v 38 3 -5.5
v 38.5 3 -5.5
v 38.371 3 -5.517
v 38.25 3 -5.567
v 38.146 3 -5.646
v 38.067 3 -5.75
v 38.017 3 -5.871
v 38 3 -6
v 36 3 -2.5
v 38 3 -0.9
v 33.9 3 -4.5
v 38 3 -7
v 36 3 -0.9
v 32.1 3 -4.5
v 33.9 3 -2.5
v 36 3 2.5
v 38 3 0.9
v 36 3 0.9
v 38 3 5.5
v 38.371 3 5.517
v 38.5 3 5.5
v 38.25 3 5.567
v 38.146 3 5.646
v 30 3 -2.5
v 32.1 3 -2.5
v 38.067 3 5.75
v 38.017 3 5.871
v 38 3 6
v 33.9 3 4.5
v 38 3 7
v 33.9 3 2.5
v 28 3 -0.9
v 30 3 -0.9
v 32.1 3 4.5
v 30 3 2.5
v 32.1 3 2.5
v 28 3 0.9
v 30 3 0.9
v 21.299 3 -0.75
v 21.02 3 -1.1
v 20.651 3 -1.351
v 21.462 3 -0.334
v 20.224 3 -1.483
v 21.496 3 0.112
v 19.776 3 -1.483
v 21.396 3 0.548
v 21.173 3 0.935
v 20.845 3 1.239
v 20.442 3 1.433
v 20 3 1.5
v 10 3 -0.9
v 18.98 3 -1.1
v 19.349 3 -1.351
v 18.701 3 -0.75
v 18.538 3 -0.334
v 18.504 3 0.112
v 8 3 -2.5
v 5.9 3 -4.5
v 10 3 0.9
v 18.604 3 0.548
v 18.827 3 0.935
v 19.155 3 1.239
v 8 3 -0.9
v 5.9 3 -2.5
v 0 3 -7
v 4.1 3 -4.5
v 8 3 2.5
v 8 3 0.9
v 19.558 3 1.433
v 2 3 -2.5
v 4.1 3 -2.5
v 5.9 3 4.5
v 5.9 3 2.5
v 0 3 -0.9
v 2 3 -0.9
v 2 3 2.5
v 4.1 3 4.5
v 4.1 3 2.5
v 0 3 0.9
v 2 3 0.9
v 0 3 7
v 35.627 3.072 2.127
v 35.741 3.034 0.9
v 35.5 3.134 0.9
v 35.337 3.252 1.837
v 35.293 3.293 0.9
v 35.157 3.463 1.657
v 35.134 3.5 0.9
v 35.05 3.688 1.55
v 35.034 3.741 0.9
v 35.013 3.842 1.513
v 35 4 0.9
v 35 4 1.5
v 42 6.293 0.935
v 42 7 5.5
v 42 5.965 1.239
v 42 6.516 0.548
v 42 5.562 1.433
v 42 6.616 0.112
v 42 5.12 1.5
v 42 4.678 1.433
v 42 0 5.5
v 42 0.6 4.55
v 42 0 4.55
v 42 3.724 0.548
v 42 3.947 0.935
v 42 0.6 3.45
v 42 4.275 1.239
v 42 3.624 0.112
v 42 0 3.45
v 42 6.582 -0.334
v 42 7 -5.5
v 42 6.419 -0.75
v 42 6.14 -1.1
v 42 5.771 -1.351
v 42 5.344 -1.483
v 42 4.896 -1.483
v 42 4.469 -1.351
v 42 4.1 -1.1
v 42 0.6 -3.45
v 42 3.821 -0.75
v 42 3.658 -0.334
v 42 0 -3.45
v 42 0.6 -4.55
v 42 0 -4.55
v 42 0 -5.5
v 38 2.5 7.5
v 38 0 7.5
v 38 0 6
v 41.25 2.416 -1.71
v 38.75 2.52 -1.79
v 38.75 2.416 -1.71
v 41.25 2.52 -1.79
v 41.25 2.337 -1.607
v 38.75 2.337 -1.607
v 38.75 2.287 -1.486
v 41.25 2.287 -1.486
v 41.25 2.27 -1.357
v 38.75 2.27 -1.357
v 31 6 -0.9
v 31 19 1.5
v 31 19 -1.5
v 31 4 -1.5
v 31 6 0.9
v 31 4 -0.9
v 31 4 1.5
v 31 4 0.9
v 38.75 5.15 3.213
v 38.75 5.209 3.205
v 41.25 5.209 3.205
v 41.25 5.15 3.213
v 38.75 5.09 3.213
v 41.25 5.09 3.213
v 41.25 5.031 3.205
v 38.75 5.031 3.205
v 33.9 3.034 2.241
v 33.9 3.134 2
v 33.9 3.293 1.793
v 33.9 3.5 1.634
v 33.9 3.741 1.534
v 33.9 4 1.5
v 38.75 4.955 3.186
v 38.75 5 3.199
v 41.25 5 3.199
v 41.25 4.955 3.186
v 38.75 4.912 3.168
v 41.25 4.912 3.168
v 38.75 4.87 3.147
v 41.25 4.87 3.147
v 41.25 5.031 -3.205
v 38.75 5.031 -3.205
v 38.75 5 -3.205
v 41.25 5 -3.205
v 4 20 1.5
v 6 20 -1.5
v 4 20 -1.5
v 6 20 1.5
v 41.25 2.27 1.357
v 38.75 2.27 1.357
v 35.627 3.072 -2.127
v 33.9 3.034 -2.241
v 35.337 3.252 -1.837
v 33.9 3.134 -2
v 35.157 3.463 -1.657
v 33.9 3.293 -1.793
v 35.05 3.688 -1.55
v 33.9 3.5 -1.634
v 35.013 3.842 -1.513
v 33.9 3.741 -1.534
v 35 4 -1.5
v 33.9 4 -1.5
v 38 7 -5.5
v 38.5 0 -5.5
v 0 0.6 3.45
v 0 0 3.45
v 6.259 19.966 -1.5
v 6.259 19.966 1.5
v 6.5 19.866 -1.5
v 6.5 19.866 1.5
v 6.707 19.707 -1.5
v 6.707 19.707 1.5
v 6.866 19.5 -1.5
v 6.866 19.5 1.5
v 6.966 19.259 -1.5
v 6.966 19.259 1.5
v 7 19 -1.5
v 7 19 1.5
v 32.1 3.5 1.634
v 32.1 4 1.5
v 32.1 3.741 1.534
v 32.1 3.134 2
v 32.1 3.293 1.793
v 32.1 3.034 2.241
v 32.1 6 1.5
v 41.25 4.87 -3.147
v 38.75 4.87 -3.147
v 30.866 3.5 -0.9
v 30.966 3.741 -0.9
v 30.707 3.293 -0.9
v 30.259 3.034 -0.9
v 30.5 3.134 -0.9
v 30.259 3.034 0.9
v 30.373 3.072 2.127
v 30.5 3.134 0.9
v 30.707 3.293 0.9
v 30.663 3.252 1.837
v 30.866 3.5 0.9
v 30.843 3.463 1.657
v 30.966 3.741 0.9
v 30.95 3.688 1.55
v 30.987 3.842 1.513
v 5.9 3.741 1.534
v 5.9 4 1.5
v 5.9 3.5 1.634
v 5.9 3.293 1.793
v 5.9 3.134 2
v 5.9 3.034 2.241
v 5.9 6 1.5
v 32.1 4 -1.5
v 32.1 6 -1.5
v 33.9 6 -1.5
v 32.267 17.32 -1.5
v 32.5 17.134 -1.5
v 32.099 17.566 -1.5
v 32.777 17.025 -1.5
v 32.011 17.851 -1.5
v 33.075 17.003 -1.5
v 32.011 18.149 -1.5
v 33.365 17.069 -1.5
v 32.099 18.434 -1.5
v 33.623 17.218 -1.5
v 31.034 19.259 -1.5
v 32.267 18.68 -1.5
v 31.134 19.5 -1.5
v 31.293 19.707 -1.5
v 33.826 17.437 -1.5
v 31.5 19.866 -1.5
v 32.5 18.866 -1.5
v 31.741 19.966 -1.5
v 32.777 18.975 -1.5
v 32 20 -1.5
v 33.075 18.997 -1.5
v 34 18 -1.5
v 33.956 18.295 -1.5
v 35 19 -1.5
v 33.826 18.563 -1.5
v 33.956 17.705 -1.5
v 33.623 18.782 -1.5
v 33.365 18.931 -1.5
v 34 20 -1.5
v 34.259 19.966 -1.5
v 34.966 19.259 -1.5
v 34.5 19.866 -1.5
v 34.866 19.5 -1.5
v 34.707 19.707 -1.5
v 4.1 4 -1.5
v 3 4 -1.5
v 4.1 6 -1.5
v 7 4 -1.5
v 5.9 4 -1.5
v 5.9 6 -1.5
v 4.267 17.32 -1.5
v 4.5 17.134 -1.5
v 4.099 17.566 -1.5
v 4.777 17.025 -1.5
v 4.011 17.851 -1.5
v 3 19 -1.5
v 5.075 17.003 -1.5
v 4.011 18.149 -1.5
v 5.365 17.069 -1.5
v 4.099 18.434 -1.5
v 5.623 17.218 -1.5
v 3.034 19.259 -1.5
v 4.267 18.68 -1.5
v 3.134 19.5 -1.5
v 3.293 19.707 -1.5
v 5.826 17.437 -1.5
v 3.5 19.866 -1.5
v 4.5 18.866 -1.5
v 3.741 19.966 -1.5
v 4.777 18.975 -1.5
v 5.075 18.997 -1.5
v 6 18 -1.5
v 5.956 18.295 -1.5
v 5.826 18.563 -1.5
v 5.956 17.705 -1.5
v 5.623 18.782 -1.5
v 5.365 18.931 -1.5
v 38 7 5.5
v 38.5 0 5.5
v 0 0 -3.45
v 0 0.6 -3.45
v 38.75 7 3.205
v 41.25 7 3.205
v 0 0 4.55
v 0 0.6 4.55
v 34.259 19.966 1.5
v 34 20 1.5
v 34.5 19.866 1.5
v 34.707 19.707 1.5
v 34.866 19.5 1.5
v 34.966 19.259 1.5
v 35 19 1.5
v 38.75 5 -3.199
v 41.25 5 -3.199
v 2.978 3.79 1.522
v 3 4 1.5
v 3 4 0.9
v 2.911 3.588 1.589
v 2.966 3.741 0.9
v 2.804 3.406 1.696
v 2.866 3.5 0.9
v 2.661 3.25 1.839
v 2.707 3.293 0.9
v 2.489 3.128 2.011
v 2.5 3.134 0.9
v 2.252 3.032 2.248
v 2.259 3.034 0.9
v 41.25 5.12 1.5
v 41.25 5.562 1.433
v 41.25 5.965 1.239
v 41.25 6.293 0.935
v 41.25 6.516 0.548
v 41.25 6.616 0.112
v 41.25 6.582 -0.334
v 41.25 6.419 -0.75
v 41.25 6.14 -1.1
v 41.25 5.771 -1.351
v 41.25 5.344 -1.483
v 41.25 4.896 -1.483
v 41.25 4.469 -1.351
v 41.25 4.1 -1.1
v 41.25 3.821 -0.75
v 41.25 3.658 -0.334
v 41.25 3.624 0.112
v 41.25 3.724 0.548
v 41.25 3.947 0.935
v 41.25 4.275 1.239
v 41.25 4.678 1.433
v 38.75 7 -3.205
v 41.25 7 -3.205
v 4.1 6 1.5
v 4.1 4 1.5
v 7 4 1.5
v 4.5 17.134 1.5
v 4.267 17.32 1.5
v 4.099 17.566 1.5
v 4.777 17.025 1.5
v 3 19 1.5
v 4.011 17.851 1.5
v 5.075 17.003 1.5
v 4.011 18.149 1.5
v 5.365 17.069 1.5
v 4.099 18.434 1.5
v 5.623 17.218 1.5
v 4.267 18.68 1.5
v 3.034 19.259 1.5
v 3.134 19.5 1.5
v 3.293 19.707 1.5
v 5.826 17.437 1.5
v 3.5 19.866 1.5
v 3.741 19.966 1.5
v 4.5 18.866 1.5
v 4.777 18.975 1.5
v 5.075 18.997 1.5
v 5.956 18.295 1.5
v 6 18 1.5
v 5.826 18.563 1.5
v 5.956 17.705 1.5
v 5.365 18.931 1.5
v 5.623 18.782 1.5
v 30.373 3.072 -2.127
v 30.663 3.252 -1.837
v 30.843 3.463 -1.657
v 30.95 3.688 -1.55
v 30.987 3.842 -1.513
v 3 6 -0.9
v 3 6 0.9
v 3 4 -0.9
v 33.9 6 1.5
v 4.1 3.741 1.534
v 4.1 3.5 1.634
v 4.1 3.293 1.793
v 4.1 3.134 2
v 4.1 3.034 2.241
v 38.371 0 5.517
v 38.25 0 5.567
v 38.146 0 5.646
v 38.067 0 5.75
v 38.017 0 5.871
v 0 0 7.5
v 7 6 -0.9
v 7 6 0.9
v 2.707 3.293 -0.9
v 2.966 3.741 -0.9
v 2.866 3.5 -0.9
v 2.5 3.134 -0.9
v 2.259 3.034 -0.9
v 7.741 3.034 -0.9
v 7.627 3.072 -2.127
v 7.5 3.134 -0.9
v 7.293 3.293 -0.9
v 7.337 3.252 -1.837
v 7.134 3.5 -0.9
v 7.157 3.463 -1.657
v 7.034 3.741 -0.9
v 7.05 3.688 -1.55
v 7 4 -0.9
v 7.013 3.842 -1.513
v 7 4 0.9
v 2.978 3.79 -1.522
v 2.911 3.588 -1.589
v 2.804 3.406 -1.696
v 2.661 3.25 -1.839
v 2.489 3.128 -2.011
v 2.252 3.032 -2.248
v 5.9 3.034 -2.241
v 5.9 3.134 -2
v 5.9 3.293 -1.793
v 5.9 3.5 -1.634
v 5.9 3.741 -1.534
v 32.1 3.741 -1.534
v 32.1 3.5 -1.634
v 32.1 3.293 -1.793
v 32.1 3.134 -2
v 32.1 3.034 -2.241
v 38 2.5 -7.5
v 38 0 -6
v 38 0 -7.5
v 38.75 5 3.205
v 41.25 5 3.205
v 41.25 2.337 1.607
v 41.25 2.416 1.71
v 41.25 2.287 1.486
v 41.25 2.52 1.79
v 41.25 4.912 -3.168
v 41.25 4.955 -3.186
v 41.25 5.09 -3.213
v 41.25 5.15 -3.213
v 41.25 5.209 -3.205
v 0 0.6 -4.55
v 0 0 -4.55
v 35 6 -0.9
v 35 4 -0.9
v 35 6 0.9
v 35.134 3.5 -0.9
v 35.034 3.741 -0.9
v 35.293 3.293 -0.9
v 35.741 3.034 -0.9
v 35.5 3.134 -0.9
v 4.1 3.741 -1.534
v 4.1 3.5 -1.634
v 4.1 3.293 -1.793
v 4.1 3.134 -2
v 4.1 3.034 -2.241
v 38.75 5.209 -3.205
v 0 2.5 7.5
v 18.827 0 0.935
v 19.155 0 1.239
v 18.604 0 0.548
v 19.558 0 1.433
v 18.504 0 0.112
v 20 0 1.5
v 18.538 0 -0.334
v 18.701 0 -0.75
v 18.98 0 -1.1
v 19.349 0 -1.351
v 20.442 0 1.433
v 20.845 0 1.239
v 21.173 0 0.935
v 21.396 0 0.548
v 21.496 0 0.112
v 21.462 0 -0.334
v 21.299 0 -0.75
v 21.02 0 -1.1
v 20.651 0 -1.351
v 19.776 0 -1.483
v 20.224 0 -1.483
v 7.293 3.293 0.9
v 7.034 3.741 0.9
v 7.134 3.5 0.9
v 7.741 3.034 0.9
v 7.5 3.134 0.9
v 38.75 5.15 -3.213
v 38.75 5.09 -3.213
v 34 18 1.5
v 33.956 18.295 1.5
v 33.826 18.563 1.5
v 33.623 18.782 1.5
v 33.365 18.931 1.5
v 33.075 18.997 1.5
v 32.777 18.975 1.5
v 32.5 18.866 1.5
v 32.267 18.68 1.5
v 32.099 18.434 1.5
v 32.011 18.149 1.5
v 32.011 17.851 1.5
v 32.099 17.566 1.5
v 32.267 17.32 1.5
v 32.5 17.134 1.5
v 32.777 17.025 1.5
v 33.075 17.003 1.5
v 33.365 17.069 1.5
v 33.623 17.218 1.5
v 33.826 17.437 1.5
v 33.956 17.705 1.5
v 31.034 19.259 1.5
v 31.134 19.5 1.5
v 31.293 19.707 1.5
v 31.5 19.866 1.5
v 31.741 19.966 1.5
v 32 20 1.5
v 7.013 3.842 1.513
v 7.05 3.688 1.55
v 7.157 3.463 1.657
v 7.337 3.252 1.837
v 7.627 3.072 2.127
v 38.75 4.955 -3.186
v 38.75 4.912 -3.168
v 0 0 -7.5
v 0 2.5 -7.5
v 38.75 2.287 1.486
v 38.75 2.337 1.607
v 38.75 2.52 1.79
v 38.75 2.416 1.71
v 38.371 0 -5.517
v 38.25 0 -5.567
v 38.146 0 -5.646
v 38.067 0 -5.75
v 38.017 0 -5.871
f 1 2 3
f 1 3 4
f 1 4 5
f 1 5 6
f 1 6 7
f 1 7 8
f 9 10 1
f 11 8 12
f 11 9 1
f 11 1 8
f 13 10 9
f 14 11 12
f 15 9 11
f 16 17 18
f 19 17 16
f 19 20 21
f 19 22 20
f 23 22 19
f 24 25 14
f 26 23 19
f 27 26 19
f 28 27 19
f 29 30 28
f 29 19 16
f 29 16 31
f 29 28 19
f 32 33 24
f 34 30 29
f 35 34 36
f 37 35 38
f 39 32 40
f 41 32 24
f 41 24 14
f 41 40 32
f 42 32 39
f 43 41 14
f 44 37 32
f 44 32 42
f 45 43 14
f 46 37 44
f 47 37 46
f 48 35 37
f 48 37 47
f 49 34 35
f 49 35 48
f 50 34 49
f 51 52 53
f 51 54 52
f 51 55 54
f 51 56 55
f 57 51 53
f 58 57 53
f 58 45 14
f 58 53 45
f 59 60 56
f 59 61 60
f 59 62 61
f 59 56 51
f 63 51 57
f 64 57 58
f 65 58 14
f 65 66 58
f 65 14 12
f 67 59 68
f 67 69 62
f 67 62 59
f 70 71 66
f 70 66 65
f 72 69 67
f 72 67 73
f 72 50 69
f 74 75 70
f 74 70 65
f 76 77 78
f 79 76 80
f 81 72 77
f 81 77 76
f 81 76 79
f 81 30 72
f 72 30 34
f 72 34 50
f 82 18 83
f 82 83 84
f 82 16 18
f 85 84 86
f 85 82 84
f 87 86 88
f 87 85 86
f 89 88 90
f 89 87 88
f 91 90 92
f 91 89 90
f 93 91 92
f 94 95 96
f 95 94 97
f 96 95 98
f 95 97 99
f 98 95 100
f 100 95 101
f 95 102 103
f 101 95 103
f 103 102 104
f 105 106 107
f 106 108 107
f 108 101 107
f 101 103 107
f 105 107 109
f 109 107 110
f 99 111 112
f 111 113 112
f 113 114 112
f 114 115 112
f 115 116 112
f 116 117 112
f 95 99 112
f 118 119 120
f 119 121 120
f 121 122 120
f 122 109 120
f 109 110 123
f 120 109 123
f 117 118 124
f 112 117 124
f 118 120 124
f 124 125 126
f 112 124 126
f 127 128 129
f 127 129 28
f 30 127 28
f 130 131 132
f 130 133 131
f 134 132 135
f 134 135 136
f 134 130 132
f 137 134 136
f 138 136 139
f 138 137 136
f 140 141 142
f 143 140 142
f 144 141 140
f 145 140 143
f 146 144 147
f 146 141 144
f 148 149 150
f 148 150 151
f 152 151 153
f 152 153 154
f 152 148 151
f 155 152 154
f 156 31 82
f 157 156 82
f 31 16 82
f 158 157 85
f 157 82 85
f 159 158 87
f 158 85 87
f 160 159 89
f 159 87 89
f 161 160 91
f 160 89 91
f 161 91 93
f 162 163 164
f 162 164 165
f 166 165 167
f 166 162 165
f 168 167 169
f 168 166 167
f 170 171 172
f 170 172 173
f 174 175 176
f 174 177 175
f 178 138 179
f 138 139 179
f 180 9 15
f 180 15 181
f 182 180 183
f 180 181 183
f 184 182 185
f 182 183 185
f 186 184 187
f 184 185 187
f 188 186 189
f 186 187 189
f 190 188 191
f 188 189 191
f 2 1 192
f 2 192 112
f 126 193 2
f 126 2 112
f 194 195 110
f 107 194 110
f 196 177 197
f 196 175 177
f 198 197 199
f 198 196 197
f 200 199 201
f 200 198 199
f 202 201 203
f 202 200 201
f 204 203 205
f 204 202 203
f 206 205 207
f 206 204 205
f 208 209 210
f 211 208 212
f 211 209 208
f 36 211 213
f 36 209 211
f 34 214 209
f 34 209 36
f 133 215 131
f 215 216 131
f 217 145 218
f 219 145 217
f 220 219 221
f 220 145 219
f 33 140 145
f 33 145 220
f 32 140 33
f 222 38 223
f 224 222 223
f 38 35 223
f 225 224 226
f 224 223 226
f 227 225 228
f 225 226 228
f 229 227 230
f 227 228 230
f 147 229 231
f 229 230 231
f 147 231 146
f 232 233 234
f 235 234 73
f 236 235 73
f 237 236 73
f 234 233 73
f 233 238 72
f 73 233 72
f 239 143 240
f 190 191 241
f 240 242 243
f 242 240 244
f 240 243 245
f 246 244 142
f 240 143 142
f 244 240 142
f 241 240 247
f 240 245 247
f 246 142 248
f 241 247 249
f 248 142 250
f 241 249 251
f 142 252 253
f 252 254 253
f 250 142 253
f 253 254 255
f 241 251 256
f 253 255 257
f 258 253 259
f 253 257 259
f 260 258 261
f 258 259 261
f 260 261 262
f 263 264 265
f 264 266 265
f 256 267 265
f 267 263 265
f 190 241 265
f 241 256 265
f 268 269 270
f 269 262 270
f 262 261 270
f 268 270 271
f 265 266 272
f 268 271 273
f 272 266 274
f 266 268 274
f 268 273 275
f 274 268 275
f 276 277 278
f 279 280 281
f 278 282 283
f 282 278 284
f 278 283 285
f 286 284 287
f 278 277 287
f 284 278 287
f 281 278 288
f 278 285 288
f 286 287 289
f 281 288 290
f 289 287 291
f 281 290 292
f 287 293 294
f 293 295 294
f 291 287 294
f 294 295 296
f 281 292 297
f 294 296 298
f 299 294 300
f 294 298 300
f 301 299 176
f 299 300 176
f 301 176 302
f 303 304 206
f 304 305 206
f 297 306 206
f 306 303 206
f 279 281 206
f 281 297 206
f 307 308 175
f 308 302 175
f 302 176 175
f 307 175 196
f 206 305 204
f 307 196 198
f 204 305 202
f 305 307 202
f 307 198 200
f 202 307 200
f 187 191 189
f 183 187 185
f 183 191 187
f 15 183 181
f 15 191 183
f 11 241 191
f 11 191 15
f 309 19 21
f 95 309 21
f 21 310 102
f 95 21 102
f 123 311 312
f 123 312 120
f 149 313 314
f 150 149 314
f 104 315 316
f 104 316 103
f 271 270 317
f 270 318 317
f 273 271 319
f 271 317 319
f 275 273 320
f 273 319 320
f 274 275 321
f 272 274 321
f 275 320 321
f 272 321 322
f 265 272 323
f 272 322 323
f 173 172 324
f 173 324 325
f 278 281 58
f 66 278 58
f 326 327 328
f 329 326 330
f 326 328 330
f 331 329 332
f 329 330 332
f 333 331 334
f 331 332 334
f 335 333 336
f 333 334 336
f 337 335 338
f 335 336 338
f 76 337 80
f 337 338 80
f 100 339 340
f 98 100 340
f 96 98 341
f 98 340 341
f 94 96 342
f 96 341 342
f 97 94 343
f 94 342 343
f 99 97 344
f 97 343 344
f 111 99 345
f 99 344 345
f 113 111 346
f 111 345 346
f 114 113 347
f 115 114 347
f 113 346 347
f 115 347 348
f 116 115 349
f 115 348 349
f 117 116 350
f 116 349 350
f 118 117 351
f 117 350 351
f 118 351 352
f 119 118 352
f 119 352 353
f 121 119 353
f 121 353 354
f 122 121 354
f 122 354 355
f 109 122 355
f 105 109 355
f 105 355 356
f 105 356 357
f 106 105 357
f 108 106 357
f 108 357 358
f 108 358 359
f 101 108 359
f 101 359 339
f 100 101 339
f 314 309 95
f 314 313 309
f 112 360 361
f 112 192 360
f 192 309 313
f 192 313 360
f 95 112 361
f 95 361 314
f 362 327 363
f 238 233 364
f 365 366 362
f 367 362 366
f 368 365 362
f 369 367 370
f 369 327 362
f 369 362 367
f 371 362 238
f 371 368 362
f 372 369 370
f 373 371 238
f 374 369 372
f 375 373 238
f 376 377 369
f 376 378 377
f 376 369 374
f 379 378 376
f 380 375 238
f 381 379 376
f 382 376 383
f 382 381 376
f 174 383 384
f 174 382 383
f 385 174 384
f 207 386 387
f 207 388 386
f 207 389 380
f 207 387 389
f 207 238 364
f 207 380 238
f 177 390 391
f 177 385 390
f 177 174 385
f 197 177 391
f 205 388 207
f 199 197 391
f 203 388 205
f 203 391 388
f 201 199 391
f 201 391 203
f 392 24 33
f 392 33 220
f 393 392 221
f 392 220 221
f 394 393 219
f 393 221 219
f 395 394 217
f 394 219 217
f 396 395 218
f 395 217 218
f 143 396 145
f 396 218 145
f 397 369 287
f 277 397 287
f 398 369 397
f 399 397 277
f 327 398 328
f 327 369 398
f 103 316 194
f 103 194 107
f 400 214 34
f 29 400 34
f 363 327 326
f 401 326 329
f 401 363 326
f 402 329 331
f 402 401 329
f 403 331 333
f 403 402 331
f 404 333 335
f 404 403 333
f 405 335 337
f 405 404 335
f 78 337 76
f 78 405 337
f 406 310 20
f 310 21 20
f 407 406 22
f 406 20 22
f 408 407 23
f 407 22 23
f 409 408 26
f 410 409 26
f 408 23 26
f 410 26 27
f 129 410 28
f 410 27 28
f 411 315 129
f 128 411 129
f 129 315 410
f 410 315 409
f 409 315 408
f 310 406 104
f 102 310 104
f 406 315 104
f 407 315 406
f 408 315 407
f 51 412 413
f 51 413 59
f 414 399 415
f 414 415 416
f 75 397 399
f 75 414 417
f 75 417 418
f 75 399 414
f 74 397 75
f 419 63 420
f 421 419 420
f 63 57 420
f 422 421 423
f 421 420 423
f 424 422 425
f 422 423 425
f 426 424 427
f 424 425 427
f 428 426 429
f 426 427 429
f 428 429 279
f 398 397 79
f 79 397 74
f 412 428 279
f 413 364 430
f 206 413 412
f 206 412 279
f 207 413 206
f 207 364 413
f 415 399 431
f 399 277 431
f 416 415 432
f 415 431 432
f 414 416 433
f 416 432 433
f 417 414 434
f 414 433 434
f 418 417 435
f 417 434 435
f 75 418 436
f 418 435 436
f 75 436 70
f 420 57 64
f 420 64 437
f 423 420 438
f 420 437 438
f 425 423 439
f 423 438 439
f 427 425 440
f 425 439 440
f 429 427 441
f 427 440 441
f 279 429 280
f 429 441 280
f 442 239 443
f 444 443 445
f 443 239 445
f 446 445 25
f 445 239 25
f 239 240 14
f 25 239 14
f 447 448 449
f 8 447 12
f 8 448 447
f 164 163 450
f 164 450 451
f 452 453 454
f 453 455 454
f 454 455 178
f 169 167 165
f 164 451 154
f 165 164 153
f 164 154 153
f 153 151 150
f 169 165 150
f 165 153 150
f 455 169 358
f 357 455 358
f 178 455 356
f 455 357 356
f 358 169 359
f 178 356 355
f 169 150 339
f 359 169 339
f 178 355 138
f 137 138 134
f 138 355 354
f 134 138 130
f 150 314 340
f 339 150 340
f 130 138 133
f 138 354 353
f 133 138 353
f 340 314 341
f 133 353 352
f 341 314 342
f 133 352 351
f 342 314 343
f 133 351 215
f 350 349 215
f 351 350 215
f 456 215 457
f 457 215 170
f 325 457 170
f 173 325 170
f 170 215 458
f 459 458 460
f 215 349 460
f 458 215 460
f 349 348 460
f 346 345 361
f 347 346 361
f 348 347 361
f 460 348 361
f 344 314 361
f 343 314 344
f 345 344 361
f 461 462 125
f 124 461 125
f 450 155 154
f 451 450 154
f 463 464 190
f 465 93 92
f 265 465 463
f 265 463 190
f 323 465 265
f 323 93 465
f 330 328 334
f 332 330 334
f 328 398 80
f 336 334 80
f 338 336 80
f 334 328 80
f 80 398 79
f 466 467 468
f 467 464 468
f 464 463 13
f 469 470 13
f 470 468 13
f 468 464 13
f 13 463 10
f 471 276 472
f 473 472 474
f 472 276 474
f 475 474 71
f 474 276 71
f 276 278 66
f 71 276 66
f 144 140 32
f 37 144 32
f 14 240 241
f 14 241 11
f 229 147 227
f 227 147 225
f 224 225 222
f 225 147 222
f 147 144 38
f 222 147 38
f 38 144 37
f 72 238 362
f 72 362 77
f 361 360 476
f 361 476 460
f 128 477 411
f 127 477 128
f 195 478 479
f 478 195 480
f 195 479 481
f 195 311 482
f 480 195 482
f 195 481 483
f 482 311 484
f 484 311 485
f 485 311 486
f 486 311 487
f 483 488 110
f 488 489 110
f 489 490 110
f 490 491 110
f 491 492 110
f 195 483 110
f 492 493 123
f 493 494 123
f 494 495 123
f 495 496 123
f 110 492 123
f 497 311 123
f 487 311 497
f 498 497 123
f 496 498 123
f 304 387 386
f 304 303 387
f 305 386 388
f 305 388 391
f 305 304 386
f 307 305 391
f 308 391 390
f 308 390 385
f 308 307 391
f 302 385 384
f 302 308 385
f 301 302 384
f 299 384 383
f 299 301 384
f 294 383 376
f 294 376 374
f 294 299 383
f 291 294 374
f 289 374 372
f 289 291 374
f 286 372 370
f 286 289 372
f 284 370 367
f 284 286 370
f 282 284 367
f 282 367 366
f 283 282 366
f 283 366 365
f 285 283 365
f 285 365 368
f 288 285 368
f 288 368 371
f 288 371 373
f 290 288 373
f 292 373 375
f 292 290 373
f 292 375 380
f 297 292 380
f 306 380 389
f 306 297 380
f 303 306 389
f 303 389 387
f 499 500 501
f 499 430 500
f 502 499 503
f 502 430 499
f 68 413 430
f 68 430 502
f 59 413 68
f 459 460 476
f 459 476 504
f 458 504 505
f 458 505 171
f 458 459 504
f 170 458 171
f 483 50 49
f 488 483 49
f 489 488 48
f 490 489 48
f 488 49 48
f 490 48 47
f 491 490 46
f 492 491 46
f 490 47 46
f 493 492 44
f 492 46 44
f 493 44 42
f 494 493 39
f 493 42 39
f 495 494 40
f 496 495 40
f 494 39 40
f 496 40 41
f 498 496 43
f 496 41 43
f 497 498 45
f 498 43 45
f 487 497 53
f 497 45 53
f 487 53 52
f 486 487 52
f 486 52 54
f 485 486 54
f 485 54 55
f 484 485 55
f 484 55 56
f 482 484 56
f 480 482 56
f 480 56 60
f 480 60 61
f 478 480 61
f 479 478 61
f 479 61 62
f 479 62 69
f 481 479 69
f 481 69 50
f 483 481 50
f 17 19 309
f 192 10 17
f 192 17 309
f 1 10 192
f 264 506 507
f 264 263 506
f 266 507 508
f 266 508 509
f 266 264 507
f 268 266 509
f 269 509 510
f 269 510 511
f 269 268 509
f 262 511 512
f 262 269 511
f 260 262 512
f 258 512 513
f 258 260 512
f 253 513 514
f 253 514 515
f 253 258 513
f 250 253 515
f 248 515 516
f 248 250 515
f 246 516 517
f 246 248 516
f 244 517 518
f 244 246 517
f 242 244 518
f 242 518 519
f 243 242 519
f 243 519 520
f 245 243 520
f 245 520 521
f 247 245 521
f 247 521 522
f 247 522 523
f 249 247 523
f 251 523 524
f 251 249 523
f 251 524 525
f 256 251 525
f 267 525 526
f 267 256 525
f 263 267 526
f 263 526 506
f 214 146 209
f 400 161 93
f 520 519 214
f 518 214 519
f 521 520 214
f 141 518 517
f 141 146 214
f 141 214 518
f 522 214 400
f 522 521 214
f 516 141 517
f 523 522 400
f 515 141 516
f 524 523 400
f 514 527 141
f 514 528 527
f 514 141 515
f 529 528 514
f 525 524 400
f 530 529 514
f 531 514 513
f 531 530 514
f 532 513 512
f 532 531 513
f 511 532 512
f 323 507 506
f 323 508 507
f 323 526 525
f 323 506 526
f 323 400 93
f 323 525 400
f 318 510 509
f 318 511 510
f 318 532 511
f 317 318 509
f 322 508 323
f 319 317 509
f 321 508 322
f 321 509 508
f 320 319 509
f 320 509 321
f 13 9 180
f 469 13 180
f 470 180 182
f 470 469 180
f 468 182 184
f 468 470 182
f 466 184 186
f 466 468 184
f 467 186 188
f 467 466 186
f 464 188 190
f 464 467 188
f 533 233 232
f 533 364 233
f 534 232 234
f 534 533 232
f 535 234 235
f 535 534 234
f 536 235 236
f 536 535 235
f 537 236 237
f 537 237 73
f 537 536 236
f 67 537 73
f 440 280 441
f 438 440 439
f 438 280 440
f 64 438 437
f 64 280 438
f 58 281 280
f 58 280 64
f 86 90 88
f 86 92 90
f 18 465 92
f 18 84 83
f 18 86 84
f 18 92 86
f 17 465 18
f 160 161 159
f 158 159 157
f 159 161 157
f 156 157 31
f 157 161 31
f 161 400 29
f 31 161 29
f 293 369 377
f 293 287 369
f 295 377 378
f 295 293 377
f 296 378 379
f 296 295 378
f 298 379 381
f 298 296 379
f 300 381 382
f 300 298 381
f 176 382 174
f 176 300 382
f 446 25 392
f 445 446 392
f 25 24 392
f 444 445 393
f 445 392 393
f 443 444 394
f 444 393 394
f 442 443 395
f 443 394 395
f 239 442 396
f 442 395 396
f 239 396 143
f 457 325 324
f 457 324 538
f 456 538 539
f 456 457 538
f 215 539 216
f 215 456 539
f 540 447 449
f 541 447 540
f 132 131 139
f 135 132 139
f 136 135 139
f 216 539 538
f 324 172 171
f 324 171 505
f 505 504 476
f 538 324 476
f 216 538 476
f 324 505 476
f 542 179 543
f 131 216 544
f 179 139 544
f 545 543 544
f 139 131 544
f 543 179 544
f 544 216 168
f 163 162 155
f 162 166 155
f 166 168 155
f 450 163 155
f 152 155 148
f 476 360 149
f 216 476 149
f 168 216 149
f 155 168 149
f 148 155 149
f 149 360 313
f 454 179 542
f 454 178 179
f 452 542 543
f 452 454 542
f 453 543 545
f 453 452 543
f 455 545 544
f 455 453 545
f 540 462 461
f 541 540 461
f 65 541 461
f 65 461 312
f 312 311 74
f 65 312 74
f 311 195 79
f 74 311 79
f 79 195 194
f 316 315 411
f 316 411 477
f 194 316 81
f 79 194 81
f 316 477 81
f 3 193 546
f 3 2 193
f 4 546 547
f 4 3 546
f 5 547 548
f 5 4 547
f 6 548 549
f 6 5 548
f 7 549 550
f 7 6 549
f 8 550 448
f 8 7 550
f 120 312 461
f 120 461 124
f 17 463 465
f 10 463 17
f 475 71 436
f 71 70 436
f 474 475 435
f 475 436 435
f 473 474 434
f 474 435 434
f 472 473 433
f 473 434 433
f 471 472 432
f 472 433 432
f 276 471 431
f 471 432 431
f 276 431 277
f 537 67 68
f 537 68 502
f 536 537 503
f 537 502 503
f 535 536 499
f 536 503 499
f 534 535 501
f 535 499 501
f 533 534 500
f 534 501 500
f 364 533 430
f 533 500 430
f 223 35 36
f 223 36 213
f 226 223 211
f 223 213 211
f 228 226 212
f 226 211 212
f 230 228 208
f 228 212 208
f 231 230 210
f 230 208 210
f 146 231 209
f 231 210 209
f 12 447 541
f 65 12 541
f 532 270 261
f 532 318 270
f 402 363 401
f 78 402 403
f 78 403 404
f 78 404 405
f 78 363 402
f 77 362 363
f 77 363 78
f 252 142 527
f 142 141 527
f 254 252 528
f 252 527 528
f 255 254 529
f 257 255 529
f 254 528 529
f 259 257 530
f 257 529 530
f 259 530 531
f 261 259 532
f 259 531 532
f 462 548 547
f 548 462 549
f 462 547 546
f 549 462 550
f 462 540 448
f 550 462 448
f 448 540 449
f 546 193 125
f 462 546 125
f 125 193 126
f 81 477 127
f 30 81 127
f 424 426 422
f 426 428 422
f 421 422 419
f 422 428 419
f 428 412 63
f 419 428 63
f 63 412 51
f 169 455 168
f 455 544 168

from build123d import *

# Parameters (mm, degrees)
CROQUIS1_R                   = 1
SALIENTE_EXTRUIR1_DEPTH      = 1.5
CROQUIS2_W                   = 38
CROQUIS2_H                   = 3
SALIENTE_EXTRUIR2_DEPTH      = 6
CROQUIS3_W                   = 38
CROQUIS3_H                   = 3
SALIENTE_EXTRUIR3_DEPTH      = 6
REDONDEO1_R                  = 1
NERVIO1_REACH                = 45.592
CROQUIS4_WALL_W              = 93.426354762
CROQUIS4_WALL_H              = 1.8
NERVIO5_REACH                = 45.592
CROQUIS5_WALL_W              = 93.426354762
CROQUIS5_WALL_H              = 1.8
NERVIO6_REACH                = 41.31
CROQUIS6_WALL_W              = 84.861976732
CROQUIS6_WALL_H              = 1.8
NERVIO7_REACH                = 41.31
CROQUIS7_WALL_W              = 84.861976732
CROQUIS7_WALL_H              = 1.8
REDONDEO2_R                  = 1
CROQUIS8_W                   = 38
CROQUIS8_H                   = 1.1
CROQUIS8_W_2                 = 38.249115133
CORTAR_EXTRUIR1_DEPTH        = 0.6
SALIENTE_EXTRUIR5_DEPTH      = 4
SALIENTE_EXTRUIR5_DEPTH_BACK = 3
CROQUIS10_W                  = 4
CROQUIS10_H                  = 11
CORTAR_EXTRUIR2_START        = -2
CORTAR_EXTRUIR2_DEPTH        = 1.25
REDONDEO5_R                  = 0.5
CROQUIS13_W                  = 4
CROQUIS13_H                  = 1.1
CORTAR_EXTRUIR4_DEPTH        = 0.6
CROQUIS14_W                  = 2.5
CROQUIS14_H                  = 6.410956056
CORTAR_EXTRUIR5_DEPTH        = 2
CORTAR_EXTRUIR6_START        = -3.25
CROQUIS11_3_R                = 1.5
CORTAR_EXTRUIR6_DEPTH        = 4
CORTAR_EXTRUIR7_REACH        = 47.927
CROQUIS16_R                  = 1.5
REDONDEO6_R                  = 0.5
CHAFL_N1_SIZE                = 0.5


with BuildPart() as part:
    # Croquis1 → Saliente-Extruir1 (new, symmetric)
    with BuildSketch(Plane.XY):
        Polygon((0, 0), (38, 0), (38, 3), (35, 3), (35, 20), (31, 20), (31, 3), (7, 3), (7, 20), (3, 20), (3, 3), (0, 3), align=None)
        with Locations((5, 18)):
            Circle(CROQUIS1_R, mode=Mode.SUBTRACT)
        with Locations((33, 18)):
            Circle(CROQUIS1_R, mode=Mode.SUBTRACT)
    extrude(amount=SALIENTE_EXTRUIR1_DEPTH, both=True)

    # Croquis2 → Saliente-Extruir2 (add)
    with BuildSketch(Plane.XY.offset(1.5)):
        with Locations((19, 1.5)):
            Rectangle(CROQUIS2_W, CROQUIS2_H)
    extrude(amount=SALIENTE_EXTRUIR2_DEPTH)

    # Croquis3 → Saliente-Extruir3 (add)
    with BuildSketch(Plane(origin=(0, 0, -1.5), x_dir=(-1, 0, 0), z_dir=(0, 0, -1))):
        with Locations((-19, 1.5)):
            Rectangle(CROQUIS3_W, CROQUIS3_H)
    extrude(amount=SALIENTE_EXTRUIR3_DEPTH)

    # Redondeo1
    redondeo1_edges = [part.edges().sort_by_distance(p)[0] for p in [
        (3, 20, 0),
        (7, 20, 0),
        (31, 20, 0),
        (35, 20, 0),
    ]]
    fillet(redondeo1_edges, radius=REDONDEO1_R)

    # Croquis4 wall → Nervio1 (add, up to next)
    with BuildSketch(Plane(origin=(36.5, 4.5, 0), x_dir=(0.707106781187, -0.707106781187, 0), z_dir=(0.707106781187, 0.707106781187, 0)), mode=Mode.PRIVATE) as nervio1_sk1:
        Rectangle(CROQUIS4_WALL_W, CROQUIS4_WALL_H)
    nervio1_tool1 = extrude(nervio1_sk1.sketch, amount=-NERVIO1_REACH, mode=Mode.PRIVATE) - part.part
    nervio1 = nervio1_tool1.solids().sort_by_distance((36.5, 4.5, 0))[0]
    add(nervio1)

    # Croquis5 wall → Nervio5 (add, up to next)
    with BuildSketch(Plane(origin=(29.5, 4.5, 0), x_dir=(-0.707106781187, -0.707106781187, 0), z_dir=(0.707106781187, -0.707106781187, 0)), mode=Mode.PRIVATE) as nervio5_sk1:
        Rectangle(CROQUIS5_WALL_W, CROQUIS5_WALL_H)
    nervio5_tool1 = extrude(nervio5_sk1.sketch, amount=NERVIO5_REACH, mode=Mode.PRIVATE) - part.part
    nervio5 = nervio5_tool1.solids().sort_by_distance((29.5, 4.5, 0))[0]
    add(nervio5)

    # Croquis6 wall → Nervio6 (add, up to next)
    with BuildSketch(Plane(origin=(33, 4.5, -3), x_dir=(0, -0.707106781187, -0.707106781187), z_dir=(0, 0.707106781187, -0.707106781187)), mode=Mode.PRIVATE) as nervio6_sk1:
        Rectangle(CROQUIS6_WALL_W, CROQUIS6_WALL_H)
    nervio6_tool1 = extrude(nervio6_sk1.sketch, amount=-NERVIO6_REACH, mode=Mode.PRIVATE) - part.part
    nervio6 = nervio6_tool1.solids().sort_by_distance((33, 4.5, -3))[0]
    add(nervio6)

    # Croquis7 wall → Nervio7 (add, up to next)
    with BuildSketch(Plane(origin=(33, 4.5, 3), x_dir=(0, -0.707106781187, 0.707106781187), z_dir=(0, -0.707106781187, -0.707106781187)), mode=Mode.PRIVATE) as nervio7_sk1:
        Rectangle(CROQUIS7_WALL_W, CROQUIS7_WALL_H)
    nervio7_tool1 = extrude(nervio7_sk1.sketch, amount=NERVIO7_REACH, mode=Mode.PRIVATE) - part.part
    nervio7 = nervio7_tool1.solids().sort_by_distance((33, 4.5, 3))[0]
    add(nervio7)

    # Simetría3: Nervio1, Nervio5, Nervio6, Nervio7 across plane
    add(nervio1.mirror(Plane.ZY.offset(-19)))
    add(nervio5.mirror(Plane.ZY.offset(-19)))
    add(nervio6.mirror(Plane.ZY.offset(-19)))
    add(nervio7.mirror(Plane.ZY.offset(-19)))

    # Redondeo2
    redondeo2_edges = [part.edges().sort_by_distance(p)[0] for p in [
        (35, 3, -1.2),
        (31, 3, -1.2),
        (34.45, 3, -1.5),
        (3, 3, 1.2),
        (7, 3, 1.2),
        (31.55, 3, 1.5),
        (31, 3, 1.2),
        (35, 3, 1.2),
        (3, 3, -1.2),
        (7, 3, -1.2),
        (6.45, 3, -1.5),
        (3.55, 3, 1.5),
        (6.45, 3, 1.5),
        (34.45, 3, 1.5),
        (31.55, 3, -1.5),
        (3.55, 3, -1.5),
    ]]
    fillet(redondeo2_edges, radius=REDONDEO2_R)

    # Croquis8 → Cortar-Extruir1 (cut)
    with BuildSketch(Plane.XZ):
        with Locations((19, 4)):
            Rectangle(CROQUIS8_W, CROQUIS8_H)
        with Locations((19.124557567, -4)):
            Rectangle(CROQUIS8_W_2, CROQUIS8_H)
    extrude(amount=-CORTAR_EXTRUIR1_DEPTH, mode=Mode.SUBTRACT)

    # Croquis10 → Saliente-Extruir5 (add, two sides: drawn at the far end of the back side and taken through both)
    with BuildSketch(Plane(origin=(0, 3, 0), x_dir=(1, 0, 0), z_dir=(0, 1, 0)).offset(-SALIENTE_EXTRUIR5_DEPTH_BACK)):
        with Locations((40, 0)):
            Rectangle(CROQUIS10_W, CROQUIS10_H)
    extrude(amount=SALIENTE_EXTRUIR5_DEPTH + SALIENTE_EXTRUIR5_DEPTH_BACK)

    # Croquis11 → Cortar-Extruir2 (cut, symmetric)
    with BuildSketch(Plane.ZY.offset(-38).offset(CORTAR_EXTRUIR2_START)):
        Polygon((1.645448267, 2.27), (3.290896534, 5.12), (1.645448267, 7.97), (-1.645448267, 7.97), (-3.290896534, 5.12), (-1.645448267, 2.27), align=None)
    extrude(amount=CORTAR_EXTRUIR2_DEPTH, both=True, mode=Mode.SUBTRACT)

    # Redondeo5
    redondeo5_edges = [part.edges().sort_by_distance(p)[0] for p in [
        (40, 5.12, -3.290896534),
        (40, 2.27, -1.645448267),
        (40, 2.27, 1.645448267),
        (40, 5.12, 3.290896534),
    ]]
    fillet(redondeo5_edges, radius=REDONDEO5_R)

    # Croquis13 → Cortar-Extruir4 (cut)
    with BuildSketch(Plane.XZ):
        with Locations((40, 4)):
            Rectangle(CROQUIS13_W, CROQUIS13_H)
        with Locations((40, -4)):
            Rectangle(CROQUIS13_W, CROQUIS13_H)
    extrude(amount=-CORTAR_EXTRUIR4_DEPTH, mode=Mode.SUBTRACT)

    # Croquis14 → Cortar-Extruir5 (cut)
    with BuildSketch(Plane(origin=(0, 7, 0), x_dir=(1, 0, 0), z_dir=(0, 1, 0))):
        with Locations((40, 0)):
            Rectangle(CROQUIS14_W, CROQUIS14_H)
    extrude(amount=-CORTAR_EXTRUIR5_DEPTH, mode=Mode.SUBTRACT)

    # Croquis11<3> → Cortar-Extruir6 (cut)
    with BuildSketch(Plane.ZY.offset(-38).offset(CORTAR_EXTRUIR6_START)):
        with Locations((0, 5.12)):
            Circle(CROQUIS11_3_R)
    extrude(amount=-CORTAR_EXTRUIR6_DEPTH, mode=Mode.SUBTRACT)

    # Croquis16 → Cortar-Extruir7 (cut, up to next)
    with BuildSketch(Plane(origin=(0, 3, 0), x_dir=(1, 0, 0), z_dir=(0, 1, 0)), mode=Mode.PRIVATE) as cortar_extruir7_sk1:
        with Locations(Location((20, 0, 0), (0, 0, 270))):
            Circle(CROQUIS16_R)
    cortar_extruir7_tool1 = extrude(cortar_extruir7_sk1.sketch, amount=-CORTAR_EXTRUIR7_REACH, mode=Mode.PRIVATE) & part.part
    add(cortar_extruir7_tool1.solids().sort_by_distance((20, 3, 0))[0], mode=Mode.SUBTRACT)

    # Redondeo6
    redondeo6_edges = [part.edges().sort_by_distance(p)[0] for p in [
        (38, 1.5, 5.5),
        (38, 1.5, -5.5),
    ]]
    fillet(redondeo6_edges, radius=REDONDEO6_R)

    # Chaflán1
    chafl_n1_edges = [part.edges().sort_by_distance(p)[0] for p in [
        (19, 3, 7.5),
        (19, 3, -7.5),
    ]]
    chamfer(chafl_n1_edges, length=CHAFL_N1_SIZE)


solid = part.part
